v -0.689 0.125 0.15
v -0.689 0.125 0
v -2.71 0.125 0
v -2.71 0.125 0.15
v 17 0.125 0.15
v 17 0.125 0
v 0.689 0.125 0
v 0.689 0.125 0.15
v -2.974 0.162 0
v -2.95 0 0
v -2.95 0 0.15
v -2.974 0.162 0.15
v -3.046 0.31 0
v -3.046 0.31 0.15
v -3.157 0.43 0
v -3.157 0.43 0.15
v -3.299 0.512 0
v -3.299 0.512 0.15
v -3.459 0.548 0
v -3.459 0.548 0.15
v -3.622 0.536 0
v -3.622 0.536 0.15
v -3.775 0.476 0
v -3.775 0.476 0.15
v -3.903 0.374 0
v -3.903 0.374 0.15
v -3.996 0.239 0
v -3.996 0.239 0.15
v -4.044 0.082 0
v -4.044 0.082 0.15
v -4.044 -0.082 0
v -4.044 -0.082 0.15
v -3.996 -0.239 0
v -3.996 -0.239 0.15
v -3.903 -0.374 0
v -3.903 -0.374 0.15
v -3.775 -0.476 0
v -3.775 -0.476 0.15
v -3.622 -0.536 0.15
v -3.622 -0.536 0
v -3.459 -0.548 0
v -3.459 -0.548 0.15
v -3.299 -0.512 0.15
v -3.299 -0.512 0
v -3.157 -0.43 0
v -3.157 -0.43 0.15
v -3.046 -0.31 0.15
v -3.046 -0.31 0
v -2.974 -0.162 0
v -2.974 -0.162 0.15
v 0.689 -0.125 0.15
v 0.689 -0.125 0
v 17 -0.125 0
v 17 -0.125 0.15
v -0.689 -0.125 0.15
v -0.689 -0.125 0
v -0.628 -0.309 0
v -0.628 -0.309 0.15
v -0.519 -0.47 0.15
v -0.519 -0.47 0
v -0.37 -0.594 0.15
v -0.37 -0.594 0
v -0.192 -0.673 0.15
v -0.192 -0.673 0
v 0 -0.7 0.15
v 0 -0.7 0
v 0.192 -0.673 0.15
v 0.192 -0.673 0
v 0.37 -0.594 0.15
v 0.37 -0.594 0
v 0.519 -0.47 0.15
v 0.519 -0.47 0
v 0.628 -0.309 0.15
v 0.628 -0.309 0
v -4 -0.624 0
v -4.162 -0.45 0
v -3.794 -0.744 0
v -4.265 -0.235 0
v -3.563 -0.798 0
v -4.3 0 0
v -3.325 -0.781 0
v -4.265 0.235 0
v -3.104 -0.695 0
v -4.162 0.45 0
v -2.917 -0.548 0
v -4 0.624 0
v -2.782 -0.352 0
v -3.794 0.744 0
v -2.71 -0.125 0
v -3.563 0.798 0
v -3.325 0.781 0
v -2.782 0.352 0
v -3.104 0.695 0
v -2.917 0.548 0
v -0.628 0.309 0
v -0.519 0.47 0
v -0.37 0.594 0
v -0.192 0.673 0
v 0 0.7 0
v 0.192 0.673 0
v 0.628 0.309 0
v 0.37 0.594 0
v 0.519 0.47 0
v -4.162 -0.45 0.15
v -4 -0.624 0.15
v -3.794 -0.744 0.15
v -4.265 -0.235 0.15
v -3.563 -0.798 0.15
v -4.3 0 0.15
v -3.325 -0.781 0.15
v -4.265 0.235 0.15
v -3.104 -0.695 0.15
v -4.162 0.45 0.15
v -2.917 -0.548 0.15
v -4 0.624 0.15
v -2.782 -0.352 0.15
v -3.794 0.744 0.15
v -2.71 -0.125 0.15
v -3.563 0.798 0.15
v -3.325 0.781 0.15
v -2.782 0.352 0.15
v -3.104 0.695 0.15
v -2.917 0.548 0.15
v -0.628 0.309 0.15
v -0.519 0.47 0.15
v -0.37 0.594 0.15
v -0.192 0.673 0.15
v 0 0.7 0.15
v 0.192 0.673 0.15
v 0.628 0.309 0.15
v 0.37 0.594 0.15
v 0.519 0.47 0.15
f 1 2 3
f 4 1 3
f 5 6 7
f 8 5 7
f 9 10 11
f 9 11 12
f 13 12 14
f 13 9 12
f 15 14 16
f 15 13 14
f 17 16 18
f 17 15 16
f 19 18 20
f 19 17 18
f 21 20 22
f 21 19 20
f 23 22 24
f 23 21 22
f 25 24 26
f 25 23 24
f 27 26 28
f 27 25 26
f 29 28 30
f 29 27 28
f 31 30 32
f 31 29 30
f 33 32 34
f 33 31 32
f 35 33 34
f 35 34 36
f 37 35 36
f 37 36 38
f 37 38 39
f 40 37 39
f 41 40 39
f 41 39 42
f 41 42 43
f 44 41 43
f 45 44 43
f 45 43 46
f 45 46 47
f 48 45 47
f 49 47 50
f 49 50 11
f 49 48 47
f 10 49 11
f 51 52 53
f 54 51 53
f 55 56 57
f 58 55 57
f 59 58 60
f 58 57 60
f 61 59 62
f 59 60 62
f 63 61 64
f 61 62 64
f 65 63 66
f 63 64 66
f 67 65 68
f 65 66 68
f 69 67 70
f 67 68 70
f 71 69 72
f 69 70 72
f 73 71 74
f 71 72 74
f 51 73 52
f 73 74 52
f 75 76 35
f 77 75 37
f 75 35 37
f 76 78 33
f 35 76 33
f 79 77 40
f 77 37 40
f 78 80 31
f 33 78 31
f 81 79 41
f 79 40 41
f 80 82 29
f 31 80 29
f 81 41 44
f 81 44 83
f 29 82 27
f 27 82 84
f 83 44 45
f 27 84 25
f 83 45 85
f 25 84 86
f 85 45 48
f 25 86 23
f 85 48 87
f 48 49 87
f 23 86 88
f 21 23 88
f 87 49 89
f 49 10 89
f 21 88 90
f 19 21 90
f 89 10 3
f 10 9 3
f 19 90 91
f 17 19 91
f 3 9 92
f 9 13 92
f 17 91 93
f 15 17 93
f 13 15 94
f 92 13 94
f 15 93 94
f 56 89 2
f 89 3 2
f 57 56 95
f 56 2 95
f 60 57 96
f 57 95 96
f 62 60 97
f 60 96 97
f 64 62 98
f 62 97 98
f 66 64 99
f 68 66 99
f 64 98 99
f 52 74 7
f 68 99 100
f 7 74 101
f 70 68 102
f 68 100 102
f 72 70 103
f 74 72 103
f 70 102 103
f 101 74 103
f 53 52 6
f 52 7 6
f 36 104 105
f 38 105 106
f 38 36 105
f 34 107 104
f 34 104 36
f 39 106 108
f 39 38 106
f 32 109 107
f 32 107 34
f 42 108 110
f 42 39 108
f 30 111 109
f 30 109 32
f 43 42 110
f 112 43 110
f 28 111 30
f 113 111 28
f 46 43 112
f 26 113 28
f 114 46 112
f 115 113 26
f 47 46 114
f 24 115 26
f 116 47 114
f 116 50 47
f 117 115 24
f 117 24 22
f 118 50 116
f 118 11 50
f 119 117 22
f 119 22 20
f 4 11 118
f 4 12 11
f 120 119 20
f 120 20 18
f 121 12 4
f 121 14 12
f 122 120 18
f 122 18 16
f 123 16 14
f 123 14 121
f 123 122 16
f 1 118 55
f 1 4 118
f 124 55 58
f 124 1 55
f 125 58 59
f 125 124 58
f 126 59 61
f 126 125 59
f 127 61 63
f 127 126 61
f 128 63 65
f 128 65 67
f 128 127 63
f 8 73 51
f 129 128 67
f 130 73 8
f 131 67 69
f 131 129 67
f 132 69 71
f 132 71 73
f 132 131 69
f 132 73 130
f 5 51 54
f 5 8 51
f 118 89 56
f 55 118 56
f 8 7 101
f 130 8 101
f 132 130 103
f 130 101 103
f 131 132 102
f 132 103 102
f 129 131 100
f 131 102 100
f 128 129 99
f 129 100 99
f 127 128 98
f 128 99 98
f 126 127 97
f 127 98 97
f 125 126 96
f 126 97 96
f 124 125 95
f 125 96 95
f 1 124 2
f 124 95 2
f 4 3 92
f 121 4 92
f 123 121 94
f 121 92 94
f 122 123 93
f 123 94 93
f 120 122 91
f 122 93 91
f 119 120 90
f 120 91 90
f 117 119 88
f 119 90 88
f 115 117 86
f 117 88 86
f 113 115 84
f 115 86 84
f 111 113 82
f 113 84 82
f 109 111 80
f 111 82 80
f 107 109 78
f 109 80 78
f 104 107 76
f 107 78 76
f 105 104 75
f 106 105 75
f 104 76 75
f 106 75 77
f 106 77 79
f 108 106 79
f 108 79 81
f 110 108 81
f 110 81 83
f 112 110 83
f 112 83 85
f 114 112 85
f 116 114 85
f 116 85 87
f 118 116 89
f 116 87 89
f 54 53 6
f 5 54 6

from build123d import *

# Parameters (mm, degrees)
F0_R     = 0.55
F1_DEPTH = 0.15


with BuildPart() as f1:
    # F0 (on Top) → F1 (new body)
    with BuildSketch(Plane.XY):
        with BuildLine():
            Line((-2.709826, -0.125), (-0.688749, -0.125))
            ThreePointArc((-0.688749, -0.125), (0, -0.7), (0.688749, -0.125))
            Line((0.688749, -0.125), (17, -0.125))
            Line((17, -0.125), (17, 0.125))
            Line((17, 0.125), (0.688749, 0.125))
            ThreePointArc((0.688749, 0.125), (0, 0.7), (-0.688749, 0.125))
            Line((-0.688749, 0.125), (-2.709826, 0.125))
            ThreePointArc((-2.709826, 0.125), (-4.3, 0), (-2.709826, -0.125))
        make_face()
        with Locations((-3.5, 0)):
            Circle(F0_R, mode=Mode.SUBTRACT)
    extrude(amount=F1_DEPTH)


solid = f1.part
